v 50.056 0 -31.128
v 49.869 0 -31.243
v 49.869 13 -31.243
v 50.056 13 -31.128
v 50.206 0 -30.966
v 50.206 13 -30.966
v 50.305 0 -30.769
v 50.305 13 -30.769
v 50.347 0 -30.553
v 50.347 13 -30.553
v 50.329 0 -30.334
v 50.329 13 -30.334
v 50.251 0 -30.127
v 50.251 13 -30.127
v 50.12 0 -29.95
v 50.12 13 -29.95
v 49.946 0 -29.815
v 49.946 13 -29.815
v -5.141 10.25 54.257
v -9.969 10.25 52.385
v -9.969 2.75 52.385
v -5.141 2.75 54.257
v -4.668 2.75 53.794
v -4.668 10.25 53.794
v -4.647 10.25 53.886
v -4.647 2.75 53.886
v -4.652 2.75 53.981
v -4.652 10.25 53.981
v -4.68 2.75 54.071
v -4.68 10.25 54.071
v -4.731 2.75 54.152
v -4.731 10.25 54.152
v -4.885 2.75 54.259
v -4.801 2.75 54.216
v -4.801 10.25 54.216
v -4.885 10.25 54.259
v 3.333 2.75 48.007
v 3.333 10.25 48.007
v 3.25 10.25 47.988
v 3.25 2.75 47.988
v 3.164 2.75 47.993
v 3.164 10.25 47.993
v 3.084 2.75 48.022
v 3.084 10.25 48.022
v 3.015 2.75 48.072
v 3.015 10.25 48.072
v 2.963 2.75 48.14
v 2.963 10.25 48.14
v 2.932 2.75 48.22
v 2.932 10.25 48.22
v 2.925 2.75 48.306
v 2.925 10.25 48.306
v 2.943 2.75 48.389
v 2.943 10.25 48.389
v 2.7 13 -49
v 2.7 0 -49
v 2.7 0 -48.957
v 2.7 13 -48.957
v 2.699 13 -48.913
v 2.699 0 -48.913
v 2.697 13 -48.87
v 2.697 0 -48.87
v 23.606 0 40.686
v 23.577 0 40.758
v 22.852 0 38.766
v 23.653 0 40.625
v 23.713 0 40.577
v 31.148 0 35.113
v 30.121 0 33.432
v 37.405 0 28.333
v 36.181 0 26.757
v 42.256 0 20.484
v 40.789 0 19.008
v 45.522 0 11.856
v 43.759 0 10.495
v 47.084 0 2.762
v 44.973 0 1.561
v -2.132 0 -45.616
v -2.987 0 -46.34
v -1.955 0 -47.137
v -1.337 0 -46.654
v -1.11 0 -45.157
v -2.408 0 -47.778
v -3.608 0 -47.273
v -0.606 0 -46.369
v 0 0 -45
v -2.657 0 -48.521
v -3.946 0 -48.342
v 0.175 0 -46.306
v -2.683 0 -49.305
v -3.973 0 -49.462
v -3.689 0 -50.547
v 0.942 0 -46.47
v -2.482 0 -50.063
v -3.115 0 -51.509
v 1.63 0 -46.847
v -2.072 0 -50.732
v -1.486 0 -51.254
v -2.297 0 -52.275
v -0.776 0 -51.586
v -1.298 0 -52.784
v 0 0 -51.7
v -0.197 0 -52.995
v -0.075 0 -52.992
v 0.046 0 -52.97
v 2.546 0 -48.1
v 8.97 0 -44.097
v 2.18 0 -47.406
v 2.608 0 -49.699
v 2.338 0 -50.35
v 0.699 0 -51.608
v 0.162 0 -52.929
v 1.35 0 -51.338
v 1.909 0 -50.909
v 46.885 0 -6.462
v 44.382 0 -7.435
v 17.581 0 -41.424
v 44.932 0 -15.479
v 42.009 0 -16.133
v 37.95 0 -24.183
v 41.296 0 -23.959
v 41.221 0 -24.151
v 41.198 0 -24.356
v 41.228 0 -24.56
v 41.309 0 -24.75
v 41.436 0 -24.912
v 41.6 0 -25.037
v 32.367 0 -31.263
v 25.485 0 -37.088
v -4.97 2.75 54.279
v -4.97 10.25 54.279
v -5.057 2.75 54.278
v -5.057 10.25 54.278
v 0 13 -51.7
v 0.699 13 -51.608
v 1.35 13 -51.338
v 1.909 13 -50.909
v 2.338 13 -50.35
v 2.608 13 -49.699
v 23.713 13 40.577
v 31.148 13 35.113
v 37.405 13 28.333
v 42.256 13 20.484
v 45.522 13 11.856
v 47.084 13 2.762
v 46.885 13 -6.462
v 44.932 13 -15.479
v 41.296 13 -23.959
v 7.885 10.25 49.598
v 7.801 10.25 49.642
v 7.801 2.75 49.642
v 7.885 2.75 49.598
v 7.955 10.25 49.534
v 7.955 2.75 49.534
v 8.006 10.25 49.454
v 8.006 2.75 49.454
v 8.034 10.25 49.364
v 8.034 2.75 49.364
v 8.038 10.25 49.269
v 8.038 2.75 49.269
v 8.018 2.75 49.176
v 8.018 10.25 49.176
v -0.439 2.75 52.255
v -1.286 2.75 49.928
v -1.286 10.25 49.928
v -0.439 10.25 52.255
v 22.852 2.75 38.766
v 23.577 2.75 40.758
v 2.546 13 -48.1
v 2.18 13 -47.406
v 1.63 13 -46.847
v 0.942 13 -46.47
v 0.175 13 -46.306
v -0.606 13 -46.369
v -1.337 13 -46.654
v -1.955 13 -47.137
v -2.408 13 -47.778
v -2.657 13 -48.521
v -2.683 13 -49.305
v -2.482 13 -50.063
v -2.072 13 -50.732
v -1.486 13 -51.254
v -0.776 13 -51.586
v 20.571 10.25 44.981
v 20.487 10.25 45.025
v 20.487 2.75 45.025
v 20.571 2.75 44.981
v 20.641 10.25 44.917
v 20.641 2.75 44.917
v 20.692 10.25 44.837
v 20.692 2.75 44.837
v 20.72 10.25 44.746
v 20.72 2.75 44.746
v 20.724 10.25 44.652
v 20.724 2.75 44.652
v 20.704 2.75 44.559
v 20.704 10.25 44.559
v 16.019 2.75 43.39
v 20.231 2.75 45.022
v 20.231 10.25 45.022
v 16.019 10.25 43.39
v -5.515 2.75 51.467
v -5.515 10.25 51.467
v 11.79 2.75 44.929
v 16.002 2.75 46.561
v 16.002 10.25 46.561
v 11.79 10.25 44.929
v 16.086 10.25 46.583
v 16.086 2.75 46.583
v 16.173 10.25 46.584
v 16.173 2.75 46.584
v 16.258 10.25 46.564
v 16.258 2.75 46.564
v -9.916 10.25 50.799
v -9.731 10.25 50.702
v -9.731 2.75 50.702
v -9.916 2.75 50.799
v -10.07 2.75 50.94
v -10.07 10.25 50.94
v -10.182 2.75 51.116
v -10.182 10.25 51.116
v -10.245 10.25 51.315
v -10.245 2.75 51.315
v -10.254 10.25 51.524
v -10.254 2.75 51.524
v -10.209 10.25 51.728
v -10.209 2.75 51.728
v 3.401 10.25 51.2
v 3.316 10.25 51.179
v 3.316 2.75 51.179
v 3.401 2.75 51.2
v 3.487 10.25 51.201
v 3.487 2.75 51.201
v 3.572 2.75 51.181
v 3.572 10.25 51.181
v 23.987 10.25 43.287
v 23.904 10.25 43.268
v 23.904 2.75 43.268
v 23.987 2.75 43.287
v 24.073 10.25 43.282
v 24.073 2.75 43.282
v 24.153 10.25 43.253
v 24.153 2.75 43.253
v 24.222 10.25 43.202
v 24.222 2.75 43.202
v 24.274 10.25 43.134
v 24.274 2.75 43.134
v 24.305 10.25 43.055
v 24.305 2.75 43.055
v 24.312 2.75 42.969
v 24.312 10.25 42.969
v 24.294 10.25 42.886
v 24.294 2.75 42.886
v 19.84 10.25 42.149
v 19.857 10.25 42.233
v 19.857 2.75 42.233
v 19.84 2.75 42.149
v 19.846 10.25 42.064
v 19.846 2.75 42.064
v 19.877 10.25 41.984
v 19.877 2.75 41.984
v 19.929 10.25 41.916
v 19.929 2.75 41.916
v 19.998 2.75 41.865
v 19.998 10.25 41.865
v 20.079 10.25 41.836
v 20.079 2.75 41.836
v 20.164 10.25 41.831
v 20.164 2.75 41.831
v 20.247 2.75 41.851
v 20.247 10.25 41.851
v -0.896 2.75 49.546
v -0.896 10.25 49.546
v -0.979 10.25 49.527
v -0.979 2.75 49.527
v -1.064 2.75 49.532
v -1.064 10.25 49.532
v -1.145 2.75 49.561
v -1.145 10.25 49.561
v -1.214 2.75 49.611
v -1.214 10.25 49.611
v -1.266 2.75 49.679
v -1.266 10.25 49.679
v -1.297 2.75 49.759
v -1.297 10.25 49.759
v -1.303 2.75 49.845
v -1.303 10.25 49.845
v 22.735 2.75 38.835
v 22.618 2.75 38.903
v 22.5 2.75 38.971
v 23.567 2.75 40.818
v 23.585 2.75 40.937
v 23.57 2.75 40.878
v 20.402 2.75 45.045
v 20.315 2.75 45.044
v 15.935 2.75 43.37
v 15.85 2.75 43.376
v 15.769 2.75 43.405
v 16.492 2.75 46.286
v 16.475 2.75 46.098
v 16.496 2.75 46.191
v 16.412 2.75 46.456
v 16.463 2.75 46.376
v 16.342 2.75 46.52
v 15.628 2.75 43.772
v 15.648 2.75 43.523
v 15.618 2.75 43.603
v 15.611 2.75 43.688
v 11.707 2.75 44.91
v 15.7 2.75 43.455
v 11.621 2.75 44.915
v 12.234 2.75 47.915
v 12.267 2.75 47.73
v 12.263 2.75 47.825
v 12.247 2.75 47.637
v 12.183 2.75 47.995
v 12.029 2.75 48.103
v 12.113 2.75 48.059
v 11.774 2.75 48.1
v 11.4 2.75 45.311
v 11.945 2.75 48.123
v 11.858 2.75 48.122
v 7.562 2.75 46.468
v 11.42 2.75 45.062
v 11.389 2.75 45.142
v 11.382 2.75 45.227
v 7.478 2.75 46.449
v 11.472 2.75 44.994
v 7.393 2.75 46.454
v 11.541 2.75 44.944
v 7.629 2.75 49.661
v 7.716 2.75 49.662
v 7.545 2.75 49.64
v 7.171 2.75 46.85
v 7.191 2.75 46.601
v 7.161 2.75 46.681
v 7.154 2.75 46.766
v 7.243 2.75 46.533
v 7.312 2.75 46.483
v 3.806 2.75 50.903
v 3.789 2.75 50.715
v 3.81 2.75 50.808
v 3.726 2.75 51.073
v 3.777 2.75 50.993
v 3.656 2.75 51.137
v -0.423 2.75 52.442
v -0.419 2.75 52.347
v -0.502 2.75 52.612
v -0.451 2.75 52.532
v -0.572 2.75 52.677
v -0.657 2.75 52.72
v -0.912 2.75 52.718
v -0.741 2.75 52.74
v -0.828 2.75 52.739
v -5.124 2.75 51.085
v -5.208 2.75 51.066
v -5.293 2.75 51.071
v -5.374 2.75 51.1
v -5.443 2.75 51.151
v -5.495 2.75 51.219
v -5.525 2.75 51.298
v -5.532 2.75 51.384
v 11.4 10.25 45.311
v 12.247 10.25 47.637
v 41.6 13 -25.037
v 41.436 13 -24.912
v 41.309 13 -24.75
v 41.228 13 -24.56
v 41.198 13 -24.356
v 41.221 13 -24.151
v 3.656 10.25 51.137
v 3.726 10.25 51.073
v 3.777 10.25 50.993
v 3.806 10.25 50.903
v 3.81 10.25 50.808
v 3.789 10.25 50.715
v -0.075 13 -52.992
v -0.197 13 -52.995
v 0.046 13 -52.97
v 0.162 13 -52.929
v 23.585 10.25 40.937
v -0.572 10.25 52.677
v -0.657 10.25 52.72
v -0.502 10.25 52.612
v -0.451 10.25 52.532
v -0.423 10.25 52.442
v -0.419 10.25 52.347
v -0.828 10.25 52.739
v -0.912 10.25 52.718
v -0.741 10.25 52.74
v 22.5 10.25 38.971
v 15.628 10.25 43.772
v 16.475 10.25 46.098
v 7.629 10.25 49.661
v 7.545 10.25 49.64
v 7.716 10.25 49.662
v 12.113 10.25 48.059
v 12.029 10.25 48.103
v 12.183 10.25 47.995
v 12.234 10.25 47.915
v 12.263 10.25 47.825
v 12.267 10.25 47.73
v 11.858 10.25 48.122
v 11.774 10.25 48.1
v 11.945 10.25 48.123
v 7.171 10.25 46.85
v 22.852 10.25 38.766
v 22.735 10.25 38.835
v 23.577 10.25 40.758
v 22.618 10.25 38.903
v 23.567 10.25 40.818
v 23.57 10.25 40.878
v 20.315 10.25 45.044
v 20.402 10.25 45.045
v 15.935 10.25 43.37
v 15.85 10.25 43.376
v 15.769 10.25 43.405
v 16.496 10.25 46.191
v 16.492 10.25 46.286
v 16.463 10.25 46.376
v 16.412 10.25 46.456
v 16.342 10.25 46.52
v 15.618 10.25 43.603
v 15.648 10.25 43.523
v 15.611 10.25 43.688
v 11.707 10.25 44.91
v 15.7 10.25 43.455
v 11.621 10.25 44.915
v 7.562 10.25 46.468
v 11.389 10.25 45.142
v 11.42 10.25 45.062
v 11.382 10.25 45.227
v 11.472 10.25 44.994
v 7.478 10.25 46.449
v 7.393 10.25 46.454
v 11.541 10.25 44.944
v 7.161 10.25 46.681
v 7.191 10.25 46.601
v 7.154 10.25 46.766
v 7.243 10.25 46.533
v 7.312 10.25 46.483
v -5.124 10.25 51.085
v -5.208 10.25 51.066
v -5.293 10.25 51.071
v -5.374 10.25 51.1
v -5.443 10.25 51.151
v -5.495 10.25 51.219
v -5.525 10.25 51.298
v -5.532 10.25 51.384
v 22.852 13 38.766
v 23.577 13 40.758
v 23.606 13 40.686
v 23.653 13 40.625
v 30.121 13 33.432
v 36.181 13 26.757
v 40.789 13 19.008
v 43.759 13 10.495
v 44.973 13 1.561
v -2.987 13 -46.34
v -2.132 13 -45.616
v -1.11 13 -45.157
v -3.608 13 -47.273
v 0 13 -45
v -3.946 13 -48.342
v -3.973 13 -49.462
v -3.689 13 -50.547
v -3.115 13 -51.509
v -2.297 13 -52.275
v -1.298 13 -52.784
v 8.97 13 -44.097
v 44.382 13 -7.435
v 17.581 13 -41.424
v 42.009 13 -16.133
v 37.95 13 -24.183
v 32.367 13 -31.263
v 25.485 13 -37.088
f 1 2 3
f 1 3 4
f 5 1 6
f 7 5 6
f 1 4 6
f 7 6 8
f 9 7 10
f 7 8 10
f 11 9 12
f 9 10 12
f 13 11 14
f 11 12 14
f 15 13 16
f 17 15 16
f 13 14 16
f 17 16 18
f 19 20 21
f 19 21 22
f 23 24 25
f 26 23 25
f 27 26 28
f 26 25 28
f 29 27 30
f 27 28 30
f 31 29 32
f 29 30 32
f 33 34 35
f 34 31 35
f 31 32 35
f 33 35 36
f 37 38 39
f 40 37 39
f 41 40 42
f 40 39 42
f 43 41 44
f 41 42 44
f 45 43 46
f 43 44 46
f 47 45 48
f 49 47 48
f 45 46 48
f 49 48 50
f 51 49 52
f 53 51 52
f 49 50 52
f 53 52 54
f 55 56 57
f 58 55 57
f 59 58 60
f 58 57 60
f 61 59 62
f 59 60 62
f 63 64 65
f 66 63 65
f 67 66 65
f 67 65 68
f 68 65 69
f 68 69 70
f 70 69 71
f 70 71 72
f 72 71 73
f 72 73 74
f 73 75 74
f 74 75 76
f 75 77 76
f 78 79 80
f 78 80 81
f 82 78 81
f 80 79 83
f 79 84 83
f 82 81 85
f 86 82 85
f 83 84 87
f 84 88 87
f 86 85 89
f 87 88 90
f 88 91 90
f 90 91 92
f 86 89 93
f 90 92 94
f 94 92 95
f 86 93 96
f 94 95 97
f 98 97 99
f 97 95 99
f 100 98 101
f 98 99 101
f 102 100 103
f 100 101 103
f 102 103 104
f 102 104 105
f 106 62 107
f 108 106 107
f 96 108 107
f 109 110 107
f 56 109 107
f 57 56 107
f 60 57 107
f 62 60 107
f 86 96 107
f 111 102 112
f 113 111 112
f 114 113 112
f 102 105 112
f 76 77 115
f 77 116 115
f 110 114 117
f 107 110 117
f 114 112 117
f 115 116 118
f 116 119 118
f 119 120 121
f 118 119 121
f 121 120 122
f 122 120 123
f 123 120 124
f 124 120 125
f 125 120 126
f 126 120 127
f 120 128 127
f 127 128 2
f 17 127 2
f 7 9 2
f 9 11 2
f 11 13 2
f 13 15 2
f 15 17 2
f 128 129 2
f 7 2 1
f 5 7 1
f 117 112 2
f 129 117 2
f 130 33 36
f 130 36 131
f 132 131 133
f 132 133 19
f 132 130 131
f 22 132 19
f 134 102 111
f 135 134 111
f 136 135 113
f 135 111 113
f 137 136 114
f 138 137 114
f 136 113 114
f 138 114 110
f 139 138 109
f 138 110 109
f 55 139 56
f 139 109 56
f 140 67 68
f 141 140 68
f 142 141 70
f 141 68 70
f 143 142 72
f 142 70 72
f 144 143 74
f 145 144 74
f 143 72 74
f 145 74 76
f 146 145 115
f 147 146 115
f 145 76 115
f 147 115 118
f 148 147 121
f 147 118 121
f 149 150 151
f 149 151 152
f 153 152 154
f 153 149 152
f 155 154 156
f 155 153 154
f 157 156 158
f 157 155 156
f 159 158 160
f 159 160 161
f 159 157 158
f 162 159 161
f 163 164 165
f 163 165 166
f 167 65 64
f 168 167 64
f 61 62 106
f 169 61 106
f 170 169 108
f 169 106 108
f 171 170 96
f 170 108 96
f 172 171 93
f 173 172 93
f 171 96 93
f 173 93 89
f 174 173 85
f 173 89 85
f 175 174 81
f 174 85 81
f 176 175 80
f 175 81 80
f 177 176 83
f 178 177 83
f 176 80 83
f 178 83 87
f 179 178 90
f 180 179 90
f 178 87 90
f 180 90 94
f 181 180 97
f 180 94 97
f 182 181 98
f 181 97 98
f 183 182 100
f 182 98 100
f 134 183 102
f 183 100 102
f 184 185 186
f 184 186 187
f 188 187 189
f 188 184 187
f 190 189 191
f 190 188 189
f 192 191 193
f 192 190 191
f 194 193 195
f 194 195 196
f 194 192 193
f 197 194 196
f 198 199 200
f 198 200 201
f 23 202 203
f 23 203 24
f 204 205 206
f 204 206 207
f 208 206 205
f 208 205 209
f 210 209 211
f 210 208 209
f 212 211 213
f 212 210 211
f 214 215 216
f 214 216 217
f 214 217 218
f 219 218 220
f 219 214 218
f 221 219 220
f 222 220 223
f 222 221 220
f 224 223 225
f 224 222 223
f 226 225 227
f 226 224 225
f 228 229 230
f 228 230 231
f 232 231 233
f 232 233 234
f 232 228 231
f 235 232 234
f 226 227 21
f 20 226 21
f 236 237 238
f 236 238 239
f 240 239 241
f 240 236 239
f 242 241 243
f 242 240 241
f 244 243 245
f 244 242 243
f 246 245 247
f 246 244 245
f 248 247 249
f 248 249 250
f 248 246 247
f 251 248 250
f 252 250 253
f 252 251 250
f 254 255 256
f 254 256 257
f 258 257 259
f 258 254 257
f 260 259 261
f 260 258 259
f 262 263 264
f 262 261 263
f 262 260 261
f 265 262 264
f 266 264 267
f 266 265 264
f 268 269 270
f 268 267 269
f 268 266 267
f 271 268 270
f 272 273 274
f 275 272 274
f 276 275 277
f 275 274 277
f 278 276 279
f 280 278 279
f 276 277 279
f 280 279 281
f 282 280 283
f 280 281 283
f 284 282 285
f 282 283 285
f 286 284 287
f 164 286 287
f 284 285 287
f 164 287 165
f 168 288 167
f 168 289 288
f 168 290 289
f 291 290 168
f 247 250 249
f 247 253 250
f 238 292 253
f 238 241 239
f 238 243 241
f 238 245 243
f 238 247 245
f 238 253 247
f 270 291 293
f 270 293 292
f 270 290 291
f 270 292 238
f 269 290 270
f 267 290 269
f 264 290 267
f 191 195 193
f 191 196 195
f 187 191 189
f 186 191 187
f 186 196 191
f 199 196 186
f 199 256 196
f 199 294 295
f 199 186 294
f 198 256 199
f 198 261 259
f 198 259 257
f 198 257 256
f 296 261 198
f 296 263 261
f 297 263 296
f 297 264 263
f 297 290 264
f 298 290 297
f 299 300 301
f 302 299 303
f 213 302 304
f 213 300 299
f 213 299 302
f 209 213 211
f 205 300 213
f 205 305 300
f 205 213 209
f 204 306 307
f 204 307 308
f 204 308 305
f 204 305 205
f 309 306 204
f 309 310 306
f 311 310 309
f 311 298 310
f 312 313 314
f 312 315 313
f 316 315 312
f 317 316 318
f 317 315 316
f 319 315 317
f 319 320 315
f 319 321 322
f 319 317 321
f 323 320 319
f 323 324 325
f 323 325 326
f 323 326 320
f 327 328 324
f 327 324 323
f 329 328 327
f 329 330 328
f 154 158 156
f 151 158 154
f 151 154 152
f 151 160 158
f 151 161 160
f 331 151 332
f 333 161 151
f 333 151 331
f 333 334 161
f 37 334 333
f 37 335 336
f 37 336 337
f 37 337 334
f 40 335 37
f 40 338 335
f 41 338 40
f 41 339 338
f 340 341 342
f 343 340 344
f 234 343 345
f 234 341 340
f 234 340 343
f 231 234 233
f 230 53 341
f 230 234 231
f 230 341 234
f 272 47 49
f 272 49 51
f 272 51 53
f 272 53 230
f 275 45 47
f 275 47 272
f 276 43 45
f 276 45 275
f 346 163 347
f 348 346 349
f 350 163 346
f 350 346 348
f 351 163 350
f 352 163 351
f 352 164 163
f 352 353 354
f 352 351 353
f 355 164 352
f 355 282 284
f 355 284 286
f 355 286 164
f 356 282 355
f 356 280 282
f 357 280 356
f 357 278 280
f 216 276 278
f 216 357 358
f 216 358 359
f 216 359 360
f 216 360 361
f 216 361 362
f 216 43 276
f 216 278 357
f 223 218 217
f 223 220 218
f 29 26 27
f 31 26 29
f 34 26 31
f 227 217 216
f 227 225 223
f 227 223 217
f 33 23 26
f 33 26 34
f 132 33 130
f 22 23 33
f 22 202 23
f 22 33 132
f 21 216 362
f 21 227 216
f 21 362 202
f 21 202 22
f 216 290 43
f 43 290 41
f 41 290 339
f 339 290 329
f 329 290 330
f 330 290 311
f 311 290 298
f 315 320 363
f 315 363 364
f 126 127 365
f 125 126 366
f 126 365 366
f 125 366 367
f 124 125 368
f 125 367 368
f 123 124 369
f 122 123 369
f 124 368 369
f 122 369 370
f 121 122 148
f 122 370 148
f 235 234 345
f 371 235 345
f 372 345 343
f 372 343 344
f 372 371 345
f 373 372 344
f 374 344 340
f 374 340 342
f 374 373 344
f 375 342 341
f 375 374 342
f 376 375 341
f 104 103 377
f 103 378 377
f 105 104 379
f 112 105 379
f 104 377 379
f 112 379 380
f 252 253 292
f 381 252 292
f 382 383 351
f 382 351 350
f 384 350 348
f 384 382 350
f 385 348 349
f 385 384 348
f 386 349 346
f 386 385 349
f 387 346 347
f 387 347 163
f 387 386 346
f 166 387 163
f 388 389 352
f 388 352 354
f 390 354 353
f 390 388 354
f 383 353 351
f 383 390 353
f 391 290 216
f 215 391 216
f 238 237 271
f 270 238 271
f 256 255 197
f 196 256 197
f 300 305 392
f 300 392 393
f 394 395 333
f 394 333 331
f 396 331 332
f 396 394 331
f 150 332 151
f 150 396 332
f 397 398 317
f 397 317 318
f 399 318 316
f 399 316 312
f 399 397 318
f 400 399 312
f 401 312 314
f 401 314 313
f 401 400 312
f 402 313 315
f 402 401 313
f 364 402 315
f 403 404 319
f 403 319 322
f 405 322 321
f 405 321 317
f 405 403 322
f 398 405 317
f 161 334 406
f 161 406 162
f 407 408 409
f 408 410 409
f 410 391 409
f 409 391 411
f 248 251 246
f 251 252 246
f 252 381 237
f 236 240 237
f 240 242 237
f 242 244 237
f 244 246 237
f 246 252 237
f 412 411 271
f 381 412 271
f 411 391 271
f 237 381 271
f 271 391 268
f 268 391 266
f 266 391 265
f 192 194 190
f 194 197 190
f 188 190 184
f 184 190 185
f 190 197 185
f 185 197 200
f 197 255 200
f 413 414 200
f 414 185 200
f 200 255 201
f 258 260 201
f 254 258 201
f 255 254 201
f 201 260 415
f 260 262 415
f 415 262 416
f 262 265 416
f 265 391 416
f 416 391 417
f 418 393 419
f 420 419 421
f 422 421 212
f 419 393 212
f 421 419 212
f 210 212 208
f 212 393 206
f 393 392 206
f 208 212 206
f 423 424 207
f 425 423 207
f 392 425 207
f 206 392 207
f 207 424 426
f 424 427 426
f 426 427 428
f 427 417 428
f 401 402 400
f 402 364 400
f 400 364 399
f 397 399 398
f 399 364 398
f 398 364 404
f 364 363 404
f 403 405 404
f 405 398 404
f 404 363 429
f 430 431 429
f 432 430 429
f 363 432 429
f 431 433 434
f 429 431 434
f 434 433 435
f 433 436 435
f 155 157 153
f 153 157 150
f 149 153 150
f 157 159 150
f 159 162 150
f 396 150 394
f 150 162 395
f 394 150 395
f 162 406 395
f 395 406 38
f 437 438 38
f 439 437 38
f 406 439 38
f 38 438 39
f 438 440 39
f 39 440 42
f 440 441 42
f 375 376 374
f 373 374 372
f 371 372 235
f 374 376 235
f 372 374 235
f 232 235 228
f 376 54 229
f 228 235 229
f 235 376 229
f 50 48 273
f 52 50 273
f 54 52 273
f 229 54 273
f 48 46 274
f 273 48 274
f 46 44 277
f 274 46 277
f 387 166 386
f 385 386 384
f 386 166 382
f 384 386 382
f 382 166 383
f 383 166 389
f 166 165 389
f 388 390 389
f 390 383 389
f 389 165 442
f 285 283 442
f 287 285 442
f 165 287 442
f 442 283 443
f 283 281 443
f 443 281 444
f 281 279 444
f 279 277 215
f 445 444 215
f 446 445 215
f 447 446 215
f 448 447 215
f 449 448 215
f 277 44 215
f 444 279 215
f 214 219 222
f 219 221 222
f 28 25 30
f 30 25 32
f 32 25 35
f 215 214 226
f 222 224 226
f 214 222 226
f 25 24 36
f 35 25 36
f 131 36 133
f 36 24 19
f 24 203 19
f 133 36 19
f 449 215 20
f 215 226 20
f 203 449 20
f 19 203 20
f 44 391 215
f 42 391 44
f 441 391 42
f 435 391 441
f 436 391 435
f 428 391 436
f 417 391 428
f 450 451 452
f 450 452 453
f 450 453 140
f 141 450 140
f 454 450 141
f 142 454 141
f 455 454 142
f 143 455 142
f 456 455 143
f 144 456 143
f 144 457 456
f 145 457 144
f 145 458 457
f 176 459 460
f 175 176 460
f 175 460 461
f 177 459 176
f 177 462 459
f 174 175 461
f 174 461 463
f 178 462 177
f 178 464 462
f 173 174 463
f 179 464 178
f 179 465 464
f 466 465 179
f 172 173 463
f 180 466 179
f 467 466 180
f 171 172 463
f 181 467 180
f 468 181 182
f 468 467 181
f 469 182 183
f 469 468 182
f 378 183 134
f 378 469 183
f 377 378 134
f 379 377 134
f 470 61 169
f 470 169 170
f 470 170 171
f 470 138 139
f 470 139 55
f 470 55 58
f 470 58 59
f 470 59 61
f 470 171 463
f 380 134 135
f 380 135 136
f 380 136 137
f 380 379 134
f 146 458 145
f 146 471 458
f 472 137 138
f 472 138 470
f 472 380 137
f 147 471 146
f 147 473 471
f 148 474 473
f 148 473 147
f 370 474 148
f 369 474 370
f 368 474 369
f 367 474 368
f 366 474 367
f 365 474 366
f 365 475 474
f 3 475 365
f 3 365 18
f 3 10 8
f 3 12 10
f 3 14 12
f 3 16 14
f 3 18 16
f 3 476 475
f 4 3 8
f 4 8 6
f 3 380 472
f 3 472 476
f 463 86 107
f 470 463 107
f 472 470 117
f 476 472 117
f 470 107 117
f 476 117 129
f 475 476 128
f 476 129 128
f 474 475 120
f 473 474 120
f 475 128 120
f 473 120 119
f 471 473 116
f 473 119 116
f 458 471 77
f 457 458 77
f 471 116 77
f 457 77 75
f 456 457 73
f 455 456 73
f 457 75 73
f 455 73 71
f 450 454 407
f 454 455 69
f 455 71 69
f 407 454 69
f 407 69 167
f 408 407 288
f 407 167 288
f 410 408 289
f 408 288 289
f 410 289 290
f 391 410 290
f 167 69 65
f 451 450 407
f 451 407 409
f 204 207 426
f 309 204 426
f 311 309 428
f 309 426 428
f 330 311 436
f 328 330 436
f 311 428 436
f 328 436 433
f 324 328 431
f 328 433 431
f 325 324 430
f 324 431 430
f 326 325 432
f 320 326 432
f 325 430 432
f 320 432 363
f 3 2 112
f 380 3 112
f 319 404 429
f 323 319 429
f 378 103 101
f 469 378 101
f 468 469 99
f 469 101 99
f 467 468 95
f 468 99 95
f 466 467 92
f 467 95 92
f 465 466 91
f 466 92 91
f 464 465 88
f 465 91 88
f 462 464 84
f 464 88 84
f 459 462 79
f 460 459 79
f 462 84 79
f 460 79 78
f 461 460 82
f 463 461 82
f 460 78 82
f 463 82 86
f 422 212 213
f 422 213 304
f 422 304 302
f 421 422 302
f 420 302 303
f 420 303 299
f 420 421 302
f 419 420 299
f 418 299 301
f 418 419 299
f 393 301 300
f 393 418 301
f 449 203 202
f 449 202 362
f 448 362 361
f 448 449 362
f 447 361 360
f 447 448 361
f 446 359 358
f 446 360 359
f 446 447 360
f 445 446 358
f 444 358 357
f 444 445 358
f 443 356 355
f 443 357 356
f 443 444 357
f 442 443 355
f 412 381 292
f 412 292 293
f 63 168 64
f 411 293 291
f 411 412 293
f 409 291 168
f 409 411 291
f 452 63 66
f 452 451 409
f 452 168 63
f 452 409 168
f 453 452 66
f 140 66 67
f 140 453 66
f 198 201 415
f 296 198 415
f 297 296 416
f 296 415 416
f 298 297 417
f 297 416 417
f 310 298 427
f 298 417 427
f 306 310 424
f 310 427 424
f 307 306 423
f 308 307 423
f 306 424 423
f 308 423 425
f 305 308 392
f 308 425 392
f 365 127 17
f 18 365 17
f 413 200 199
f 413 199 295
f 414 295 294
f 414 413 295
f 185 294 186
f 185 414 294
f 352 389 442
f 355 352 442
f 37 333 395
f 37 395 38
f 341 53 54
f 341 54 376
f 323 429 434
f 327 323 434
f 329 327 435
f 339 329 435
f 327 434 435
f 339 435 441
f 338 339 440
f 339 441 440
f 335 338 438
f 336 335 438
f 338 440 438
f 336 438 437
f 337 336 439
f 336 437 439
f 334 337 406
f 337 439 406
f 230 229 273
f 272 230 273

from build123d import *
from build123d.topology import SkipClean

# Parameters (mm, degrees)
BOSS_EXTRUDE1_DEPTH = 13
CUT_EXTRUDE3_DEPTH  = 77.831899265
FILLET1_R           = 0.8
LPATTERN1_DEPTH     = 13
FILLET2_R           = 0.363442
FILLET3_R           = 0.363442
FILLET4_R           = 0.363442
FILLET5_R           = 0.363442
FILLET6_R           = 0.363442
FILLET7_R           = 0.363442
FILLET8_R           = 0.363442
FILLET9_R           = 0.3
SKETCH3_OUTSIDE_W   = 148.316
SKETCH3_OUTSIDE_H   = 39.78
SKETCH3_OUTSIDE_W_2 = 5.910380326
SKETCH3_OUTSIDE_H_2 = 7.5
CUT_EXTRUDE2_DEPTH  = 35.5


# Read off the part's stored shape, not the designer's step: LPattern1
with BuildPart() as part:
    # Sketch1 → Boss-Extrude1 (new body)
    with BuildSketch(Plane(origin=(0, 0, 0), x_dir=(1, 0, 0), z_dir=(0, 1, 0))):
        with BuildLine():
            Line((0, 51.7), (0, 53))
            ThreePointArc((0, 53), (-4, 49), (0, 45))
            ThreePointArc((0, 45), (43.466662183, 11.64685703), (22.5, -38.97114317))
            Line((22.5, -38.97114317), (-10.482378388, -50.975747159))
            Line((-10.482378388, -50.975747159), (-8.772277672, -55.674210263))
            Line((-8.772277672, -55.674210263), (24.536452539, -43.550823925))
            Line((24.536452539, -43.550823925), (23.5, -40.703193978))
            ThreePointArc((23.5, -40.703193978), (45.592051892, -11.596446998), (40.913607467, 24.644050161))
            ThreePointArc((40.913607467, 24.644050161), (24.824872502, 41.52042314), (2.696847486, 48.869563675))
            ThreePointArc((2.696847486, 48.869563675), (-1.954760609, 47.137498735), (0, 51.7))
        make_face()
        with BuildLine():
            Line((51.327605208, 30.606319113), (0, 53))
            Line((0, 53), (0, 51.7))
            ThreePointArc((0, 51.7), (1.909188309, 50.909188309), (2.7, 49))
            ThreePointArc((2.7, 49), (2.699211757, 48.934762792), (2.696847486, 48.869563675))
            ThreePointArc((2.696847486, 48.869563675), (24.824872502, 41.52042314), (40.913607467, 24.644050161))
            Line((40.913607467, 24.644050161), (51.327605208, 30.606319113))
        make_face()
    extrude(amount=BOSS_EXTRUDE1_DEPTH)

    # Sketch2 → Cut-Extrude3 (cut, through all)
    with BuildSketch(Plane(origin=(0, 13, 0), x_dir=(1, 0, 0), z_dir=(0, 1, 0))):
        Polygon((-8.772277672, -55.674210263), (-9.969348173, -52.38528609), (-5.013507189, -54.30612969), align=None)
    extrude(amount=-CUT_EXTRUDE3_DEPTH, mode=Mode.SUBTRACT)

    # Fillet1
    fillet1_edges = [part.edges().sort_by_distance(p)[0] for p in [
        (51.327605208, 6.5, -30.606319113),
        (40.913607467, 6.5, -24.644050161),
        (-10.482378388, 6.5, 50.975747159),
        (0, 6.5, -53),
    ]]
    fillet(fillet1_edges, radius=FILLET1_R)

    # LPattern1 outline → LPattern1 (cut)
    with BuildSketch(Plane(origin=(0, 0, 0), x_dir=(1, 0, 0), z_dir=(0, 1, 0))):
        Polygon((-0.784890395, -52.767039045), (-5.74073138, -50.846195445), (-4.543660878, -54.135119618), align=None)
        Polygon((19.630969381, -41.611651575), (20.828039883, -44.900575748), (24.536452539, -43.550823925), (24.520414883, -43.506760826), align=None)
        Polygon((15.402352588, -43.15074222), (16.59942309, -46.439666393), (20.358193573, -45.07158582), align=None)
        Polygon((11.173735794, -44.689832865), (12.370806296, -47.978757038), (16.129576779, -46.610676465), align=None)
        Polygon((6.945119001, -46.22892351), (8.142189502, -49.517847683), (11.900959986, -48.14976711), align=None)
        Polygon((2.716502207, -47.768014155), (3.913572709, -51.056938328), (7.672343192, -49.688857755), align=None)
        Polygon((-1.512114586, -49.3071048), (-0.315044085, -52.596028973), (3.443726399, -51.2279484), align=None)
    extrude(amount=LPATTERN1_DEPTH, mode=Mode.SUBTRACT)

    # Fillet2
    fillet2_edges = [part.edges().sort_by_distance(p)[0] for p in [
        (-4.543660878, 6.5, 54.135119618),
        (-5.013507189, 6.5, 54.30612969),
    ]]
    fillet(fillet2_edges, radius=FILLET2_R)

    # Fillet3
    fillet3_edges = [part.edges().sort_by_distance(p)[0] for p in [
        (-0.315044085, 6.5, 52.596028973),
        (-0.784890395, 6.5, 52.767039045),
    ]]
    fillet(fillet3_edges, radius=FILLET3_R)

    # Fillet4
    fillet4_edges = [part.edges().sort_by_distance(p)[0] for p in [
        (3.443726399, 6.5, 51.2279484),
        (3.913572709, 6.5, 51.056938328),
    ]]
    fillet(fillet4_edges, radius=FILLET4_R)

    # Fillet5
    fillet5_edges = [part.edges().sort_by_distance(p)[0] for p in [
        (8.142189502, 6.5, 49.517847683),
        (7.672343192, 6.5, 49.688857755),
    ]]
    fillet(fillet5_edges, radius=FILLET5_R)

    # Fillet6
    fillet6_edges = [part.edges().sort_by_distance(p)[0] for p in [
        (11.900959986, 6.5, 48.14976711),
        (12.370806296, 6.5, 47.978757038),
    ]]
    fillet(fillet6_edges, radius=FILLET6_R)

    # Fillet7
    fillet7_edges = [part.edges().sort_by_distance(p)[0] for p in [
        (16.129576779, 6.5, 46.610676465),
        (16.59942309, 6.5, 46.439666393),
    ]]
    fillet(fillet7_edges, radius=FILLET7_R)

    # Fillet8
    fillet8_edges = [part.edges().sort_by_distance(p)[0] for p in [
        (20.828039883, 6.5, 44.900575748),
        (20.358193573, 6.5, 45.07158582),
    ]]
    fillet(fillet8_edges, radius=FILLET8_R)

    # Fillet9
    fillet9_edges = [part.edges().sort_by_distance(p)[0] for p in [
        (6.945119001, 6.5, 46.22892351),
        (11.173735794, 6.5, 44.689832865),
        (-1.512114586, 6.5, 49.3071048),
        (2.716502207, 6.5, 47.768014155),
        (24.520414883, 6.5, 43.506760826),
        (19.630969381, 6.5, 41.611651575),
        (15.402352588, 6.5, 43.15074222),
        (-5.74073138, 6.5, 50.846195445),
        (23.5, 6.5, 40.703193978),
    ]]
    fillet(fillet9_edges, radius=FILLET9_R)

    # Sketch3 outside → Cut-Extrude2 (cut)
    with SkipClean():  # the faces are left unmerged after this step: merging them gives an invalid solid
        with BuildSketch(Plane(origin=(-25.639462386, 0, 9.332001131), x_dir=(0.3420201433256706, 0, 0.9396926207859078), z_dir=(-0.9396926207859078, 0, 0.3420201433256706))):
            with Locations((7.46, 6.5)):
                Rectangle(SKETCH3_OUTSIDE_W, SKETCH3_OUTSIDE_H)
            with Locations((47.141631591, 6.5)):
                Rectangle(SKETCH3_OUTSIDE_W_2, SKETCH3_OUTSIDE_H_2, mode=Mode.SUBTRACT)
        extrude(amount=-CUT_EXTRUDE2_DEPTH, mode=Mode.SUBTRACT)


solid = part.part
